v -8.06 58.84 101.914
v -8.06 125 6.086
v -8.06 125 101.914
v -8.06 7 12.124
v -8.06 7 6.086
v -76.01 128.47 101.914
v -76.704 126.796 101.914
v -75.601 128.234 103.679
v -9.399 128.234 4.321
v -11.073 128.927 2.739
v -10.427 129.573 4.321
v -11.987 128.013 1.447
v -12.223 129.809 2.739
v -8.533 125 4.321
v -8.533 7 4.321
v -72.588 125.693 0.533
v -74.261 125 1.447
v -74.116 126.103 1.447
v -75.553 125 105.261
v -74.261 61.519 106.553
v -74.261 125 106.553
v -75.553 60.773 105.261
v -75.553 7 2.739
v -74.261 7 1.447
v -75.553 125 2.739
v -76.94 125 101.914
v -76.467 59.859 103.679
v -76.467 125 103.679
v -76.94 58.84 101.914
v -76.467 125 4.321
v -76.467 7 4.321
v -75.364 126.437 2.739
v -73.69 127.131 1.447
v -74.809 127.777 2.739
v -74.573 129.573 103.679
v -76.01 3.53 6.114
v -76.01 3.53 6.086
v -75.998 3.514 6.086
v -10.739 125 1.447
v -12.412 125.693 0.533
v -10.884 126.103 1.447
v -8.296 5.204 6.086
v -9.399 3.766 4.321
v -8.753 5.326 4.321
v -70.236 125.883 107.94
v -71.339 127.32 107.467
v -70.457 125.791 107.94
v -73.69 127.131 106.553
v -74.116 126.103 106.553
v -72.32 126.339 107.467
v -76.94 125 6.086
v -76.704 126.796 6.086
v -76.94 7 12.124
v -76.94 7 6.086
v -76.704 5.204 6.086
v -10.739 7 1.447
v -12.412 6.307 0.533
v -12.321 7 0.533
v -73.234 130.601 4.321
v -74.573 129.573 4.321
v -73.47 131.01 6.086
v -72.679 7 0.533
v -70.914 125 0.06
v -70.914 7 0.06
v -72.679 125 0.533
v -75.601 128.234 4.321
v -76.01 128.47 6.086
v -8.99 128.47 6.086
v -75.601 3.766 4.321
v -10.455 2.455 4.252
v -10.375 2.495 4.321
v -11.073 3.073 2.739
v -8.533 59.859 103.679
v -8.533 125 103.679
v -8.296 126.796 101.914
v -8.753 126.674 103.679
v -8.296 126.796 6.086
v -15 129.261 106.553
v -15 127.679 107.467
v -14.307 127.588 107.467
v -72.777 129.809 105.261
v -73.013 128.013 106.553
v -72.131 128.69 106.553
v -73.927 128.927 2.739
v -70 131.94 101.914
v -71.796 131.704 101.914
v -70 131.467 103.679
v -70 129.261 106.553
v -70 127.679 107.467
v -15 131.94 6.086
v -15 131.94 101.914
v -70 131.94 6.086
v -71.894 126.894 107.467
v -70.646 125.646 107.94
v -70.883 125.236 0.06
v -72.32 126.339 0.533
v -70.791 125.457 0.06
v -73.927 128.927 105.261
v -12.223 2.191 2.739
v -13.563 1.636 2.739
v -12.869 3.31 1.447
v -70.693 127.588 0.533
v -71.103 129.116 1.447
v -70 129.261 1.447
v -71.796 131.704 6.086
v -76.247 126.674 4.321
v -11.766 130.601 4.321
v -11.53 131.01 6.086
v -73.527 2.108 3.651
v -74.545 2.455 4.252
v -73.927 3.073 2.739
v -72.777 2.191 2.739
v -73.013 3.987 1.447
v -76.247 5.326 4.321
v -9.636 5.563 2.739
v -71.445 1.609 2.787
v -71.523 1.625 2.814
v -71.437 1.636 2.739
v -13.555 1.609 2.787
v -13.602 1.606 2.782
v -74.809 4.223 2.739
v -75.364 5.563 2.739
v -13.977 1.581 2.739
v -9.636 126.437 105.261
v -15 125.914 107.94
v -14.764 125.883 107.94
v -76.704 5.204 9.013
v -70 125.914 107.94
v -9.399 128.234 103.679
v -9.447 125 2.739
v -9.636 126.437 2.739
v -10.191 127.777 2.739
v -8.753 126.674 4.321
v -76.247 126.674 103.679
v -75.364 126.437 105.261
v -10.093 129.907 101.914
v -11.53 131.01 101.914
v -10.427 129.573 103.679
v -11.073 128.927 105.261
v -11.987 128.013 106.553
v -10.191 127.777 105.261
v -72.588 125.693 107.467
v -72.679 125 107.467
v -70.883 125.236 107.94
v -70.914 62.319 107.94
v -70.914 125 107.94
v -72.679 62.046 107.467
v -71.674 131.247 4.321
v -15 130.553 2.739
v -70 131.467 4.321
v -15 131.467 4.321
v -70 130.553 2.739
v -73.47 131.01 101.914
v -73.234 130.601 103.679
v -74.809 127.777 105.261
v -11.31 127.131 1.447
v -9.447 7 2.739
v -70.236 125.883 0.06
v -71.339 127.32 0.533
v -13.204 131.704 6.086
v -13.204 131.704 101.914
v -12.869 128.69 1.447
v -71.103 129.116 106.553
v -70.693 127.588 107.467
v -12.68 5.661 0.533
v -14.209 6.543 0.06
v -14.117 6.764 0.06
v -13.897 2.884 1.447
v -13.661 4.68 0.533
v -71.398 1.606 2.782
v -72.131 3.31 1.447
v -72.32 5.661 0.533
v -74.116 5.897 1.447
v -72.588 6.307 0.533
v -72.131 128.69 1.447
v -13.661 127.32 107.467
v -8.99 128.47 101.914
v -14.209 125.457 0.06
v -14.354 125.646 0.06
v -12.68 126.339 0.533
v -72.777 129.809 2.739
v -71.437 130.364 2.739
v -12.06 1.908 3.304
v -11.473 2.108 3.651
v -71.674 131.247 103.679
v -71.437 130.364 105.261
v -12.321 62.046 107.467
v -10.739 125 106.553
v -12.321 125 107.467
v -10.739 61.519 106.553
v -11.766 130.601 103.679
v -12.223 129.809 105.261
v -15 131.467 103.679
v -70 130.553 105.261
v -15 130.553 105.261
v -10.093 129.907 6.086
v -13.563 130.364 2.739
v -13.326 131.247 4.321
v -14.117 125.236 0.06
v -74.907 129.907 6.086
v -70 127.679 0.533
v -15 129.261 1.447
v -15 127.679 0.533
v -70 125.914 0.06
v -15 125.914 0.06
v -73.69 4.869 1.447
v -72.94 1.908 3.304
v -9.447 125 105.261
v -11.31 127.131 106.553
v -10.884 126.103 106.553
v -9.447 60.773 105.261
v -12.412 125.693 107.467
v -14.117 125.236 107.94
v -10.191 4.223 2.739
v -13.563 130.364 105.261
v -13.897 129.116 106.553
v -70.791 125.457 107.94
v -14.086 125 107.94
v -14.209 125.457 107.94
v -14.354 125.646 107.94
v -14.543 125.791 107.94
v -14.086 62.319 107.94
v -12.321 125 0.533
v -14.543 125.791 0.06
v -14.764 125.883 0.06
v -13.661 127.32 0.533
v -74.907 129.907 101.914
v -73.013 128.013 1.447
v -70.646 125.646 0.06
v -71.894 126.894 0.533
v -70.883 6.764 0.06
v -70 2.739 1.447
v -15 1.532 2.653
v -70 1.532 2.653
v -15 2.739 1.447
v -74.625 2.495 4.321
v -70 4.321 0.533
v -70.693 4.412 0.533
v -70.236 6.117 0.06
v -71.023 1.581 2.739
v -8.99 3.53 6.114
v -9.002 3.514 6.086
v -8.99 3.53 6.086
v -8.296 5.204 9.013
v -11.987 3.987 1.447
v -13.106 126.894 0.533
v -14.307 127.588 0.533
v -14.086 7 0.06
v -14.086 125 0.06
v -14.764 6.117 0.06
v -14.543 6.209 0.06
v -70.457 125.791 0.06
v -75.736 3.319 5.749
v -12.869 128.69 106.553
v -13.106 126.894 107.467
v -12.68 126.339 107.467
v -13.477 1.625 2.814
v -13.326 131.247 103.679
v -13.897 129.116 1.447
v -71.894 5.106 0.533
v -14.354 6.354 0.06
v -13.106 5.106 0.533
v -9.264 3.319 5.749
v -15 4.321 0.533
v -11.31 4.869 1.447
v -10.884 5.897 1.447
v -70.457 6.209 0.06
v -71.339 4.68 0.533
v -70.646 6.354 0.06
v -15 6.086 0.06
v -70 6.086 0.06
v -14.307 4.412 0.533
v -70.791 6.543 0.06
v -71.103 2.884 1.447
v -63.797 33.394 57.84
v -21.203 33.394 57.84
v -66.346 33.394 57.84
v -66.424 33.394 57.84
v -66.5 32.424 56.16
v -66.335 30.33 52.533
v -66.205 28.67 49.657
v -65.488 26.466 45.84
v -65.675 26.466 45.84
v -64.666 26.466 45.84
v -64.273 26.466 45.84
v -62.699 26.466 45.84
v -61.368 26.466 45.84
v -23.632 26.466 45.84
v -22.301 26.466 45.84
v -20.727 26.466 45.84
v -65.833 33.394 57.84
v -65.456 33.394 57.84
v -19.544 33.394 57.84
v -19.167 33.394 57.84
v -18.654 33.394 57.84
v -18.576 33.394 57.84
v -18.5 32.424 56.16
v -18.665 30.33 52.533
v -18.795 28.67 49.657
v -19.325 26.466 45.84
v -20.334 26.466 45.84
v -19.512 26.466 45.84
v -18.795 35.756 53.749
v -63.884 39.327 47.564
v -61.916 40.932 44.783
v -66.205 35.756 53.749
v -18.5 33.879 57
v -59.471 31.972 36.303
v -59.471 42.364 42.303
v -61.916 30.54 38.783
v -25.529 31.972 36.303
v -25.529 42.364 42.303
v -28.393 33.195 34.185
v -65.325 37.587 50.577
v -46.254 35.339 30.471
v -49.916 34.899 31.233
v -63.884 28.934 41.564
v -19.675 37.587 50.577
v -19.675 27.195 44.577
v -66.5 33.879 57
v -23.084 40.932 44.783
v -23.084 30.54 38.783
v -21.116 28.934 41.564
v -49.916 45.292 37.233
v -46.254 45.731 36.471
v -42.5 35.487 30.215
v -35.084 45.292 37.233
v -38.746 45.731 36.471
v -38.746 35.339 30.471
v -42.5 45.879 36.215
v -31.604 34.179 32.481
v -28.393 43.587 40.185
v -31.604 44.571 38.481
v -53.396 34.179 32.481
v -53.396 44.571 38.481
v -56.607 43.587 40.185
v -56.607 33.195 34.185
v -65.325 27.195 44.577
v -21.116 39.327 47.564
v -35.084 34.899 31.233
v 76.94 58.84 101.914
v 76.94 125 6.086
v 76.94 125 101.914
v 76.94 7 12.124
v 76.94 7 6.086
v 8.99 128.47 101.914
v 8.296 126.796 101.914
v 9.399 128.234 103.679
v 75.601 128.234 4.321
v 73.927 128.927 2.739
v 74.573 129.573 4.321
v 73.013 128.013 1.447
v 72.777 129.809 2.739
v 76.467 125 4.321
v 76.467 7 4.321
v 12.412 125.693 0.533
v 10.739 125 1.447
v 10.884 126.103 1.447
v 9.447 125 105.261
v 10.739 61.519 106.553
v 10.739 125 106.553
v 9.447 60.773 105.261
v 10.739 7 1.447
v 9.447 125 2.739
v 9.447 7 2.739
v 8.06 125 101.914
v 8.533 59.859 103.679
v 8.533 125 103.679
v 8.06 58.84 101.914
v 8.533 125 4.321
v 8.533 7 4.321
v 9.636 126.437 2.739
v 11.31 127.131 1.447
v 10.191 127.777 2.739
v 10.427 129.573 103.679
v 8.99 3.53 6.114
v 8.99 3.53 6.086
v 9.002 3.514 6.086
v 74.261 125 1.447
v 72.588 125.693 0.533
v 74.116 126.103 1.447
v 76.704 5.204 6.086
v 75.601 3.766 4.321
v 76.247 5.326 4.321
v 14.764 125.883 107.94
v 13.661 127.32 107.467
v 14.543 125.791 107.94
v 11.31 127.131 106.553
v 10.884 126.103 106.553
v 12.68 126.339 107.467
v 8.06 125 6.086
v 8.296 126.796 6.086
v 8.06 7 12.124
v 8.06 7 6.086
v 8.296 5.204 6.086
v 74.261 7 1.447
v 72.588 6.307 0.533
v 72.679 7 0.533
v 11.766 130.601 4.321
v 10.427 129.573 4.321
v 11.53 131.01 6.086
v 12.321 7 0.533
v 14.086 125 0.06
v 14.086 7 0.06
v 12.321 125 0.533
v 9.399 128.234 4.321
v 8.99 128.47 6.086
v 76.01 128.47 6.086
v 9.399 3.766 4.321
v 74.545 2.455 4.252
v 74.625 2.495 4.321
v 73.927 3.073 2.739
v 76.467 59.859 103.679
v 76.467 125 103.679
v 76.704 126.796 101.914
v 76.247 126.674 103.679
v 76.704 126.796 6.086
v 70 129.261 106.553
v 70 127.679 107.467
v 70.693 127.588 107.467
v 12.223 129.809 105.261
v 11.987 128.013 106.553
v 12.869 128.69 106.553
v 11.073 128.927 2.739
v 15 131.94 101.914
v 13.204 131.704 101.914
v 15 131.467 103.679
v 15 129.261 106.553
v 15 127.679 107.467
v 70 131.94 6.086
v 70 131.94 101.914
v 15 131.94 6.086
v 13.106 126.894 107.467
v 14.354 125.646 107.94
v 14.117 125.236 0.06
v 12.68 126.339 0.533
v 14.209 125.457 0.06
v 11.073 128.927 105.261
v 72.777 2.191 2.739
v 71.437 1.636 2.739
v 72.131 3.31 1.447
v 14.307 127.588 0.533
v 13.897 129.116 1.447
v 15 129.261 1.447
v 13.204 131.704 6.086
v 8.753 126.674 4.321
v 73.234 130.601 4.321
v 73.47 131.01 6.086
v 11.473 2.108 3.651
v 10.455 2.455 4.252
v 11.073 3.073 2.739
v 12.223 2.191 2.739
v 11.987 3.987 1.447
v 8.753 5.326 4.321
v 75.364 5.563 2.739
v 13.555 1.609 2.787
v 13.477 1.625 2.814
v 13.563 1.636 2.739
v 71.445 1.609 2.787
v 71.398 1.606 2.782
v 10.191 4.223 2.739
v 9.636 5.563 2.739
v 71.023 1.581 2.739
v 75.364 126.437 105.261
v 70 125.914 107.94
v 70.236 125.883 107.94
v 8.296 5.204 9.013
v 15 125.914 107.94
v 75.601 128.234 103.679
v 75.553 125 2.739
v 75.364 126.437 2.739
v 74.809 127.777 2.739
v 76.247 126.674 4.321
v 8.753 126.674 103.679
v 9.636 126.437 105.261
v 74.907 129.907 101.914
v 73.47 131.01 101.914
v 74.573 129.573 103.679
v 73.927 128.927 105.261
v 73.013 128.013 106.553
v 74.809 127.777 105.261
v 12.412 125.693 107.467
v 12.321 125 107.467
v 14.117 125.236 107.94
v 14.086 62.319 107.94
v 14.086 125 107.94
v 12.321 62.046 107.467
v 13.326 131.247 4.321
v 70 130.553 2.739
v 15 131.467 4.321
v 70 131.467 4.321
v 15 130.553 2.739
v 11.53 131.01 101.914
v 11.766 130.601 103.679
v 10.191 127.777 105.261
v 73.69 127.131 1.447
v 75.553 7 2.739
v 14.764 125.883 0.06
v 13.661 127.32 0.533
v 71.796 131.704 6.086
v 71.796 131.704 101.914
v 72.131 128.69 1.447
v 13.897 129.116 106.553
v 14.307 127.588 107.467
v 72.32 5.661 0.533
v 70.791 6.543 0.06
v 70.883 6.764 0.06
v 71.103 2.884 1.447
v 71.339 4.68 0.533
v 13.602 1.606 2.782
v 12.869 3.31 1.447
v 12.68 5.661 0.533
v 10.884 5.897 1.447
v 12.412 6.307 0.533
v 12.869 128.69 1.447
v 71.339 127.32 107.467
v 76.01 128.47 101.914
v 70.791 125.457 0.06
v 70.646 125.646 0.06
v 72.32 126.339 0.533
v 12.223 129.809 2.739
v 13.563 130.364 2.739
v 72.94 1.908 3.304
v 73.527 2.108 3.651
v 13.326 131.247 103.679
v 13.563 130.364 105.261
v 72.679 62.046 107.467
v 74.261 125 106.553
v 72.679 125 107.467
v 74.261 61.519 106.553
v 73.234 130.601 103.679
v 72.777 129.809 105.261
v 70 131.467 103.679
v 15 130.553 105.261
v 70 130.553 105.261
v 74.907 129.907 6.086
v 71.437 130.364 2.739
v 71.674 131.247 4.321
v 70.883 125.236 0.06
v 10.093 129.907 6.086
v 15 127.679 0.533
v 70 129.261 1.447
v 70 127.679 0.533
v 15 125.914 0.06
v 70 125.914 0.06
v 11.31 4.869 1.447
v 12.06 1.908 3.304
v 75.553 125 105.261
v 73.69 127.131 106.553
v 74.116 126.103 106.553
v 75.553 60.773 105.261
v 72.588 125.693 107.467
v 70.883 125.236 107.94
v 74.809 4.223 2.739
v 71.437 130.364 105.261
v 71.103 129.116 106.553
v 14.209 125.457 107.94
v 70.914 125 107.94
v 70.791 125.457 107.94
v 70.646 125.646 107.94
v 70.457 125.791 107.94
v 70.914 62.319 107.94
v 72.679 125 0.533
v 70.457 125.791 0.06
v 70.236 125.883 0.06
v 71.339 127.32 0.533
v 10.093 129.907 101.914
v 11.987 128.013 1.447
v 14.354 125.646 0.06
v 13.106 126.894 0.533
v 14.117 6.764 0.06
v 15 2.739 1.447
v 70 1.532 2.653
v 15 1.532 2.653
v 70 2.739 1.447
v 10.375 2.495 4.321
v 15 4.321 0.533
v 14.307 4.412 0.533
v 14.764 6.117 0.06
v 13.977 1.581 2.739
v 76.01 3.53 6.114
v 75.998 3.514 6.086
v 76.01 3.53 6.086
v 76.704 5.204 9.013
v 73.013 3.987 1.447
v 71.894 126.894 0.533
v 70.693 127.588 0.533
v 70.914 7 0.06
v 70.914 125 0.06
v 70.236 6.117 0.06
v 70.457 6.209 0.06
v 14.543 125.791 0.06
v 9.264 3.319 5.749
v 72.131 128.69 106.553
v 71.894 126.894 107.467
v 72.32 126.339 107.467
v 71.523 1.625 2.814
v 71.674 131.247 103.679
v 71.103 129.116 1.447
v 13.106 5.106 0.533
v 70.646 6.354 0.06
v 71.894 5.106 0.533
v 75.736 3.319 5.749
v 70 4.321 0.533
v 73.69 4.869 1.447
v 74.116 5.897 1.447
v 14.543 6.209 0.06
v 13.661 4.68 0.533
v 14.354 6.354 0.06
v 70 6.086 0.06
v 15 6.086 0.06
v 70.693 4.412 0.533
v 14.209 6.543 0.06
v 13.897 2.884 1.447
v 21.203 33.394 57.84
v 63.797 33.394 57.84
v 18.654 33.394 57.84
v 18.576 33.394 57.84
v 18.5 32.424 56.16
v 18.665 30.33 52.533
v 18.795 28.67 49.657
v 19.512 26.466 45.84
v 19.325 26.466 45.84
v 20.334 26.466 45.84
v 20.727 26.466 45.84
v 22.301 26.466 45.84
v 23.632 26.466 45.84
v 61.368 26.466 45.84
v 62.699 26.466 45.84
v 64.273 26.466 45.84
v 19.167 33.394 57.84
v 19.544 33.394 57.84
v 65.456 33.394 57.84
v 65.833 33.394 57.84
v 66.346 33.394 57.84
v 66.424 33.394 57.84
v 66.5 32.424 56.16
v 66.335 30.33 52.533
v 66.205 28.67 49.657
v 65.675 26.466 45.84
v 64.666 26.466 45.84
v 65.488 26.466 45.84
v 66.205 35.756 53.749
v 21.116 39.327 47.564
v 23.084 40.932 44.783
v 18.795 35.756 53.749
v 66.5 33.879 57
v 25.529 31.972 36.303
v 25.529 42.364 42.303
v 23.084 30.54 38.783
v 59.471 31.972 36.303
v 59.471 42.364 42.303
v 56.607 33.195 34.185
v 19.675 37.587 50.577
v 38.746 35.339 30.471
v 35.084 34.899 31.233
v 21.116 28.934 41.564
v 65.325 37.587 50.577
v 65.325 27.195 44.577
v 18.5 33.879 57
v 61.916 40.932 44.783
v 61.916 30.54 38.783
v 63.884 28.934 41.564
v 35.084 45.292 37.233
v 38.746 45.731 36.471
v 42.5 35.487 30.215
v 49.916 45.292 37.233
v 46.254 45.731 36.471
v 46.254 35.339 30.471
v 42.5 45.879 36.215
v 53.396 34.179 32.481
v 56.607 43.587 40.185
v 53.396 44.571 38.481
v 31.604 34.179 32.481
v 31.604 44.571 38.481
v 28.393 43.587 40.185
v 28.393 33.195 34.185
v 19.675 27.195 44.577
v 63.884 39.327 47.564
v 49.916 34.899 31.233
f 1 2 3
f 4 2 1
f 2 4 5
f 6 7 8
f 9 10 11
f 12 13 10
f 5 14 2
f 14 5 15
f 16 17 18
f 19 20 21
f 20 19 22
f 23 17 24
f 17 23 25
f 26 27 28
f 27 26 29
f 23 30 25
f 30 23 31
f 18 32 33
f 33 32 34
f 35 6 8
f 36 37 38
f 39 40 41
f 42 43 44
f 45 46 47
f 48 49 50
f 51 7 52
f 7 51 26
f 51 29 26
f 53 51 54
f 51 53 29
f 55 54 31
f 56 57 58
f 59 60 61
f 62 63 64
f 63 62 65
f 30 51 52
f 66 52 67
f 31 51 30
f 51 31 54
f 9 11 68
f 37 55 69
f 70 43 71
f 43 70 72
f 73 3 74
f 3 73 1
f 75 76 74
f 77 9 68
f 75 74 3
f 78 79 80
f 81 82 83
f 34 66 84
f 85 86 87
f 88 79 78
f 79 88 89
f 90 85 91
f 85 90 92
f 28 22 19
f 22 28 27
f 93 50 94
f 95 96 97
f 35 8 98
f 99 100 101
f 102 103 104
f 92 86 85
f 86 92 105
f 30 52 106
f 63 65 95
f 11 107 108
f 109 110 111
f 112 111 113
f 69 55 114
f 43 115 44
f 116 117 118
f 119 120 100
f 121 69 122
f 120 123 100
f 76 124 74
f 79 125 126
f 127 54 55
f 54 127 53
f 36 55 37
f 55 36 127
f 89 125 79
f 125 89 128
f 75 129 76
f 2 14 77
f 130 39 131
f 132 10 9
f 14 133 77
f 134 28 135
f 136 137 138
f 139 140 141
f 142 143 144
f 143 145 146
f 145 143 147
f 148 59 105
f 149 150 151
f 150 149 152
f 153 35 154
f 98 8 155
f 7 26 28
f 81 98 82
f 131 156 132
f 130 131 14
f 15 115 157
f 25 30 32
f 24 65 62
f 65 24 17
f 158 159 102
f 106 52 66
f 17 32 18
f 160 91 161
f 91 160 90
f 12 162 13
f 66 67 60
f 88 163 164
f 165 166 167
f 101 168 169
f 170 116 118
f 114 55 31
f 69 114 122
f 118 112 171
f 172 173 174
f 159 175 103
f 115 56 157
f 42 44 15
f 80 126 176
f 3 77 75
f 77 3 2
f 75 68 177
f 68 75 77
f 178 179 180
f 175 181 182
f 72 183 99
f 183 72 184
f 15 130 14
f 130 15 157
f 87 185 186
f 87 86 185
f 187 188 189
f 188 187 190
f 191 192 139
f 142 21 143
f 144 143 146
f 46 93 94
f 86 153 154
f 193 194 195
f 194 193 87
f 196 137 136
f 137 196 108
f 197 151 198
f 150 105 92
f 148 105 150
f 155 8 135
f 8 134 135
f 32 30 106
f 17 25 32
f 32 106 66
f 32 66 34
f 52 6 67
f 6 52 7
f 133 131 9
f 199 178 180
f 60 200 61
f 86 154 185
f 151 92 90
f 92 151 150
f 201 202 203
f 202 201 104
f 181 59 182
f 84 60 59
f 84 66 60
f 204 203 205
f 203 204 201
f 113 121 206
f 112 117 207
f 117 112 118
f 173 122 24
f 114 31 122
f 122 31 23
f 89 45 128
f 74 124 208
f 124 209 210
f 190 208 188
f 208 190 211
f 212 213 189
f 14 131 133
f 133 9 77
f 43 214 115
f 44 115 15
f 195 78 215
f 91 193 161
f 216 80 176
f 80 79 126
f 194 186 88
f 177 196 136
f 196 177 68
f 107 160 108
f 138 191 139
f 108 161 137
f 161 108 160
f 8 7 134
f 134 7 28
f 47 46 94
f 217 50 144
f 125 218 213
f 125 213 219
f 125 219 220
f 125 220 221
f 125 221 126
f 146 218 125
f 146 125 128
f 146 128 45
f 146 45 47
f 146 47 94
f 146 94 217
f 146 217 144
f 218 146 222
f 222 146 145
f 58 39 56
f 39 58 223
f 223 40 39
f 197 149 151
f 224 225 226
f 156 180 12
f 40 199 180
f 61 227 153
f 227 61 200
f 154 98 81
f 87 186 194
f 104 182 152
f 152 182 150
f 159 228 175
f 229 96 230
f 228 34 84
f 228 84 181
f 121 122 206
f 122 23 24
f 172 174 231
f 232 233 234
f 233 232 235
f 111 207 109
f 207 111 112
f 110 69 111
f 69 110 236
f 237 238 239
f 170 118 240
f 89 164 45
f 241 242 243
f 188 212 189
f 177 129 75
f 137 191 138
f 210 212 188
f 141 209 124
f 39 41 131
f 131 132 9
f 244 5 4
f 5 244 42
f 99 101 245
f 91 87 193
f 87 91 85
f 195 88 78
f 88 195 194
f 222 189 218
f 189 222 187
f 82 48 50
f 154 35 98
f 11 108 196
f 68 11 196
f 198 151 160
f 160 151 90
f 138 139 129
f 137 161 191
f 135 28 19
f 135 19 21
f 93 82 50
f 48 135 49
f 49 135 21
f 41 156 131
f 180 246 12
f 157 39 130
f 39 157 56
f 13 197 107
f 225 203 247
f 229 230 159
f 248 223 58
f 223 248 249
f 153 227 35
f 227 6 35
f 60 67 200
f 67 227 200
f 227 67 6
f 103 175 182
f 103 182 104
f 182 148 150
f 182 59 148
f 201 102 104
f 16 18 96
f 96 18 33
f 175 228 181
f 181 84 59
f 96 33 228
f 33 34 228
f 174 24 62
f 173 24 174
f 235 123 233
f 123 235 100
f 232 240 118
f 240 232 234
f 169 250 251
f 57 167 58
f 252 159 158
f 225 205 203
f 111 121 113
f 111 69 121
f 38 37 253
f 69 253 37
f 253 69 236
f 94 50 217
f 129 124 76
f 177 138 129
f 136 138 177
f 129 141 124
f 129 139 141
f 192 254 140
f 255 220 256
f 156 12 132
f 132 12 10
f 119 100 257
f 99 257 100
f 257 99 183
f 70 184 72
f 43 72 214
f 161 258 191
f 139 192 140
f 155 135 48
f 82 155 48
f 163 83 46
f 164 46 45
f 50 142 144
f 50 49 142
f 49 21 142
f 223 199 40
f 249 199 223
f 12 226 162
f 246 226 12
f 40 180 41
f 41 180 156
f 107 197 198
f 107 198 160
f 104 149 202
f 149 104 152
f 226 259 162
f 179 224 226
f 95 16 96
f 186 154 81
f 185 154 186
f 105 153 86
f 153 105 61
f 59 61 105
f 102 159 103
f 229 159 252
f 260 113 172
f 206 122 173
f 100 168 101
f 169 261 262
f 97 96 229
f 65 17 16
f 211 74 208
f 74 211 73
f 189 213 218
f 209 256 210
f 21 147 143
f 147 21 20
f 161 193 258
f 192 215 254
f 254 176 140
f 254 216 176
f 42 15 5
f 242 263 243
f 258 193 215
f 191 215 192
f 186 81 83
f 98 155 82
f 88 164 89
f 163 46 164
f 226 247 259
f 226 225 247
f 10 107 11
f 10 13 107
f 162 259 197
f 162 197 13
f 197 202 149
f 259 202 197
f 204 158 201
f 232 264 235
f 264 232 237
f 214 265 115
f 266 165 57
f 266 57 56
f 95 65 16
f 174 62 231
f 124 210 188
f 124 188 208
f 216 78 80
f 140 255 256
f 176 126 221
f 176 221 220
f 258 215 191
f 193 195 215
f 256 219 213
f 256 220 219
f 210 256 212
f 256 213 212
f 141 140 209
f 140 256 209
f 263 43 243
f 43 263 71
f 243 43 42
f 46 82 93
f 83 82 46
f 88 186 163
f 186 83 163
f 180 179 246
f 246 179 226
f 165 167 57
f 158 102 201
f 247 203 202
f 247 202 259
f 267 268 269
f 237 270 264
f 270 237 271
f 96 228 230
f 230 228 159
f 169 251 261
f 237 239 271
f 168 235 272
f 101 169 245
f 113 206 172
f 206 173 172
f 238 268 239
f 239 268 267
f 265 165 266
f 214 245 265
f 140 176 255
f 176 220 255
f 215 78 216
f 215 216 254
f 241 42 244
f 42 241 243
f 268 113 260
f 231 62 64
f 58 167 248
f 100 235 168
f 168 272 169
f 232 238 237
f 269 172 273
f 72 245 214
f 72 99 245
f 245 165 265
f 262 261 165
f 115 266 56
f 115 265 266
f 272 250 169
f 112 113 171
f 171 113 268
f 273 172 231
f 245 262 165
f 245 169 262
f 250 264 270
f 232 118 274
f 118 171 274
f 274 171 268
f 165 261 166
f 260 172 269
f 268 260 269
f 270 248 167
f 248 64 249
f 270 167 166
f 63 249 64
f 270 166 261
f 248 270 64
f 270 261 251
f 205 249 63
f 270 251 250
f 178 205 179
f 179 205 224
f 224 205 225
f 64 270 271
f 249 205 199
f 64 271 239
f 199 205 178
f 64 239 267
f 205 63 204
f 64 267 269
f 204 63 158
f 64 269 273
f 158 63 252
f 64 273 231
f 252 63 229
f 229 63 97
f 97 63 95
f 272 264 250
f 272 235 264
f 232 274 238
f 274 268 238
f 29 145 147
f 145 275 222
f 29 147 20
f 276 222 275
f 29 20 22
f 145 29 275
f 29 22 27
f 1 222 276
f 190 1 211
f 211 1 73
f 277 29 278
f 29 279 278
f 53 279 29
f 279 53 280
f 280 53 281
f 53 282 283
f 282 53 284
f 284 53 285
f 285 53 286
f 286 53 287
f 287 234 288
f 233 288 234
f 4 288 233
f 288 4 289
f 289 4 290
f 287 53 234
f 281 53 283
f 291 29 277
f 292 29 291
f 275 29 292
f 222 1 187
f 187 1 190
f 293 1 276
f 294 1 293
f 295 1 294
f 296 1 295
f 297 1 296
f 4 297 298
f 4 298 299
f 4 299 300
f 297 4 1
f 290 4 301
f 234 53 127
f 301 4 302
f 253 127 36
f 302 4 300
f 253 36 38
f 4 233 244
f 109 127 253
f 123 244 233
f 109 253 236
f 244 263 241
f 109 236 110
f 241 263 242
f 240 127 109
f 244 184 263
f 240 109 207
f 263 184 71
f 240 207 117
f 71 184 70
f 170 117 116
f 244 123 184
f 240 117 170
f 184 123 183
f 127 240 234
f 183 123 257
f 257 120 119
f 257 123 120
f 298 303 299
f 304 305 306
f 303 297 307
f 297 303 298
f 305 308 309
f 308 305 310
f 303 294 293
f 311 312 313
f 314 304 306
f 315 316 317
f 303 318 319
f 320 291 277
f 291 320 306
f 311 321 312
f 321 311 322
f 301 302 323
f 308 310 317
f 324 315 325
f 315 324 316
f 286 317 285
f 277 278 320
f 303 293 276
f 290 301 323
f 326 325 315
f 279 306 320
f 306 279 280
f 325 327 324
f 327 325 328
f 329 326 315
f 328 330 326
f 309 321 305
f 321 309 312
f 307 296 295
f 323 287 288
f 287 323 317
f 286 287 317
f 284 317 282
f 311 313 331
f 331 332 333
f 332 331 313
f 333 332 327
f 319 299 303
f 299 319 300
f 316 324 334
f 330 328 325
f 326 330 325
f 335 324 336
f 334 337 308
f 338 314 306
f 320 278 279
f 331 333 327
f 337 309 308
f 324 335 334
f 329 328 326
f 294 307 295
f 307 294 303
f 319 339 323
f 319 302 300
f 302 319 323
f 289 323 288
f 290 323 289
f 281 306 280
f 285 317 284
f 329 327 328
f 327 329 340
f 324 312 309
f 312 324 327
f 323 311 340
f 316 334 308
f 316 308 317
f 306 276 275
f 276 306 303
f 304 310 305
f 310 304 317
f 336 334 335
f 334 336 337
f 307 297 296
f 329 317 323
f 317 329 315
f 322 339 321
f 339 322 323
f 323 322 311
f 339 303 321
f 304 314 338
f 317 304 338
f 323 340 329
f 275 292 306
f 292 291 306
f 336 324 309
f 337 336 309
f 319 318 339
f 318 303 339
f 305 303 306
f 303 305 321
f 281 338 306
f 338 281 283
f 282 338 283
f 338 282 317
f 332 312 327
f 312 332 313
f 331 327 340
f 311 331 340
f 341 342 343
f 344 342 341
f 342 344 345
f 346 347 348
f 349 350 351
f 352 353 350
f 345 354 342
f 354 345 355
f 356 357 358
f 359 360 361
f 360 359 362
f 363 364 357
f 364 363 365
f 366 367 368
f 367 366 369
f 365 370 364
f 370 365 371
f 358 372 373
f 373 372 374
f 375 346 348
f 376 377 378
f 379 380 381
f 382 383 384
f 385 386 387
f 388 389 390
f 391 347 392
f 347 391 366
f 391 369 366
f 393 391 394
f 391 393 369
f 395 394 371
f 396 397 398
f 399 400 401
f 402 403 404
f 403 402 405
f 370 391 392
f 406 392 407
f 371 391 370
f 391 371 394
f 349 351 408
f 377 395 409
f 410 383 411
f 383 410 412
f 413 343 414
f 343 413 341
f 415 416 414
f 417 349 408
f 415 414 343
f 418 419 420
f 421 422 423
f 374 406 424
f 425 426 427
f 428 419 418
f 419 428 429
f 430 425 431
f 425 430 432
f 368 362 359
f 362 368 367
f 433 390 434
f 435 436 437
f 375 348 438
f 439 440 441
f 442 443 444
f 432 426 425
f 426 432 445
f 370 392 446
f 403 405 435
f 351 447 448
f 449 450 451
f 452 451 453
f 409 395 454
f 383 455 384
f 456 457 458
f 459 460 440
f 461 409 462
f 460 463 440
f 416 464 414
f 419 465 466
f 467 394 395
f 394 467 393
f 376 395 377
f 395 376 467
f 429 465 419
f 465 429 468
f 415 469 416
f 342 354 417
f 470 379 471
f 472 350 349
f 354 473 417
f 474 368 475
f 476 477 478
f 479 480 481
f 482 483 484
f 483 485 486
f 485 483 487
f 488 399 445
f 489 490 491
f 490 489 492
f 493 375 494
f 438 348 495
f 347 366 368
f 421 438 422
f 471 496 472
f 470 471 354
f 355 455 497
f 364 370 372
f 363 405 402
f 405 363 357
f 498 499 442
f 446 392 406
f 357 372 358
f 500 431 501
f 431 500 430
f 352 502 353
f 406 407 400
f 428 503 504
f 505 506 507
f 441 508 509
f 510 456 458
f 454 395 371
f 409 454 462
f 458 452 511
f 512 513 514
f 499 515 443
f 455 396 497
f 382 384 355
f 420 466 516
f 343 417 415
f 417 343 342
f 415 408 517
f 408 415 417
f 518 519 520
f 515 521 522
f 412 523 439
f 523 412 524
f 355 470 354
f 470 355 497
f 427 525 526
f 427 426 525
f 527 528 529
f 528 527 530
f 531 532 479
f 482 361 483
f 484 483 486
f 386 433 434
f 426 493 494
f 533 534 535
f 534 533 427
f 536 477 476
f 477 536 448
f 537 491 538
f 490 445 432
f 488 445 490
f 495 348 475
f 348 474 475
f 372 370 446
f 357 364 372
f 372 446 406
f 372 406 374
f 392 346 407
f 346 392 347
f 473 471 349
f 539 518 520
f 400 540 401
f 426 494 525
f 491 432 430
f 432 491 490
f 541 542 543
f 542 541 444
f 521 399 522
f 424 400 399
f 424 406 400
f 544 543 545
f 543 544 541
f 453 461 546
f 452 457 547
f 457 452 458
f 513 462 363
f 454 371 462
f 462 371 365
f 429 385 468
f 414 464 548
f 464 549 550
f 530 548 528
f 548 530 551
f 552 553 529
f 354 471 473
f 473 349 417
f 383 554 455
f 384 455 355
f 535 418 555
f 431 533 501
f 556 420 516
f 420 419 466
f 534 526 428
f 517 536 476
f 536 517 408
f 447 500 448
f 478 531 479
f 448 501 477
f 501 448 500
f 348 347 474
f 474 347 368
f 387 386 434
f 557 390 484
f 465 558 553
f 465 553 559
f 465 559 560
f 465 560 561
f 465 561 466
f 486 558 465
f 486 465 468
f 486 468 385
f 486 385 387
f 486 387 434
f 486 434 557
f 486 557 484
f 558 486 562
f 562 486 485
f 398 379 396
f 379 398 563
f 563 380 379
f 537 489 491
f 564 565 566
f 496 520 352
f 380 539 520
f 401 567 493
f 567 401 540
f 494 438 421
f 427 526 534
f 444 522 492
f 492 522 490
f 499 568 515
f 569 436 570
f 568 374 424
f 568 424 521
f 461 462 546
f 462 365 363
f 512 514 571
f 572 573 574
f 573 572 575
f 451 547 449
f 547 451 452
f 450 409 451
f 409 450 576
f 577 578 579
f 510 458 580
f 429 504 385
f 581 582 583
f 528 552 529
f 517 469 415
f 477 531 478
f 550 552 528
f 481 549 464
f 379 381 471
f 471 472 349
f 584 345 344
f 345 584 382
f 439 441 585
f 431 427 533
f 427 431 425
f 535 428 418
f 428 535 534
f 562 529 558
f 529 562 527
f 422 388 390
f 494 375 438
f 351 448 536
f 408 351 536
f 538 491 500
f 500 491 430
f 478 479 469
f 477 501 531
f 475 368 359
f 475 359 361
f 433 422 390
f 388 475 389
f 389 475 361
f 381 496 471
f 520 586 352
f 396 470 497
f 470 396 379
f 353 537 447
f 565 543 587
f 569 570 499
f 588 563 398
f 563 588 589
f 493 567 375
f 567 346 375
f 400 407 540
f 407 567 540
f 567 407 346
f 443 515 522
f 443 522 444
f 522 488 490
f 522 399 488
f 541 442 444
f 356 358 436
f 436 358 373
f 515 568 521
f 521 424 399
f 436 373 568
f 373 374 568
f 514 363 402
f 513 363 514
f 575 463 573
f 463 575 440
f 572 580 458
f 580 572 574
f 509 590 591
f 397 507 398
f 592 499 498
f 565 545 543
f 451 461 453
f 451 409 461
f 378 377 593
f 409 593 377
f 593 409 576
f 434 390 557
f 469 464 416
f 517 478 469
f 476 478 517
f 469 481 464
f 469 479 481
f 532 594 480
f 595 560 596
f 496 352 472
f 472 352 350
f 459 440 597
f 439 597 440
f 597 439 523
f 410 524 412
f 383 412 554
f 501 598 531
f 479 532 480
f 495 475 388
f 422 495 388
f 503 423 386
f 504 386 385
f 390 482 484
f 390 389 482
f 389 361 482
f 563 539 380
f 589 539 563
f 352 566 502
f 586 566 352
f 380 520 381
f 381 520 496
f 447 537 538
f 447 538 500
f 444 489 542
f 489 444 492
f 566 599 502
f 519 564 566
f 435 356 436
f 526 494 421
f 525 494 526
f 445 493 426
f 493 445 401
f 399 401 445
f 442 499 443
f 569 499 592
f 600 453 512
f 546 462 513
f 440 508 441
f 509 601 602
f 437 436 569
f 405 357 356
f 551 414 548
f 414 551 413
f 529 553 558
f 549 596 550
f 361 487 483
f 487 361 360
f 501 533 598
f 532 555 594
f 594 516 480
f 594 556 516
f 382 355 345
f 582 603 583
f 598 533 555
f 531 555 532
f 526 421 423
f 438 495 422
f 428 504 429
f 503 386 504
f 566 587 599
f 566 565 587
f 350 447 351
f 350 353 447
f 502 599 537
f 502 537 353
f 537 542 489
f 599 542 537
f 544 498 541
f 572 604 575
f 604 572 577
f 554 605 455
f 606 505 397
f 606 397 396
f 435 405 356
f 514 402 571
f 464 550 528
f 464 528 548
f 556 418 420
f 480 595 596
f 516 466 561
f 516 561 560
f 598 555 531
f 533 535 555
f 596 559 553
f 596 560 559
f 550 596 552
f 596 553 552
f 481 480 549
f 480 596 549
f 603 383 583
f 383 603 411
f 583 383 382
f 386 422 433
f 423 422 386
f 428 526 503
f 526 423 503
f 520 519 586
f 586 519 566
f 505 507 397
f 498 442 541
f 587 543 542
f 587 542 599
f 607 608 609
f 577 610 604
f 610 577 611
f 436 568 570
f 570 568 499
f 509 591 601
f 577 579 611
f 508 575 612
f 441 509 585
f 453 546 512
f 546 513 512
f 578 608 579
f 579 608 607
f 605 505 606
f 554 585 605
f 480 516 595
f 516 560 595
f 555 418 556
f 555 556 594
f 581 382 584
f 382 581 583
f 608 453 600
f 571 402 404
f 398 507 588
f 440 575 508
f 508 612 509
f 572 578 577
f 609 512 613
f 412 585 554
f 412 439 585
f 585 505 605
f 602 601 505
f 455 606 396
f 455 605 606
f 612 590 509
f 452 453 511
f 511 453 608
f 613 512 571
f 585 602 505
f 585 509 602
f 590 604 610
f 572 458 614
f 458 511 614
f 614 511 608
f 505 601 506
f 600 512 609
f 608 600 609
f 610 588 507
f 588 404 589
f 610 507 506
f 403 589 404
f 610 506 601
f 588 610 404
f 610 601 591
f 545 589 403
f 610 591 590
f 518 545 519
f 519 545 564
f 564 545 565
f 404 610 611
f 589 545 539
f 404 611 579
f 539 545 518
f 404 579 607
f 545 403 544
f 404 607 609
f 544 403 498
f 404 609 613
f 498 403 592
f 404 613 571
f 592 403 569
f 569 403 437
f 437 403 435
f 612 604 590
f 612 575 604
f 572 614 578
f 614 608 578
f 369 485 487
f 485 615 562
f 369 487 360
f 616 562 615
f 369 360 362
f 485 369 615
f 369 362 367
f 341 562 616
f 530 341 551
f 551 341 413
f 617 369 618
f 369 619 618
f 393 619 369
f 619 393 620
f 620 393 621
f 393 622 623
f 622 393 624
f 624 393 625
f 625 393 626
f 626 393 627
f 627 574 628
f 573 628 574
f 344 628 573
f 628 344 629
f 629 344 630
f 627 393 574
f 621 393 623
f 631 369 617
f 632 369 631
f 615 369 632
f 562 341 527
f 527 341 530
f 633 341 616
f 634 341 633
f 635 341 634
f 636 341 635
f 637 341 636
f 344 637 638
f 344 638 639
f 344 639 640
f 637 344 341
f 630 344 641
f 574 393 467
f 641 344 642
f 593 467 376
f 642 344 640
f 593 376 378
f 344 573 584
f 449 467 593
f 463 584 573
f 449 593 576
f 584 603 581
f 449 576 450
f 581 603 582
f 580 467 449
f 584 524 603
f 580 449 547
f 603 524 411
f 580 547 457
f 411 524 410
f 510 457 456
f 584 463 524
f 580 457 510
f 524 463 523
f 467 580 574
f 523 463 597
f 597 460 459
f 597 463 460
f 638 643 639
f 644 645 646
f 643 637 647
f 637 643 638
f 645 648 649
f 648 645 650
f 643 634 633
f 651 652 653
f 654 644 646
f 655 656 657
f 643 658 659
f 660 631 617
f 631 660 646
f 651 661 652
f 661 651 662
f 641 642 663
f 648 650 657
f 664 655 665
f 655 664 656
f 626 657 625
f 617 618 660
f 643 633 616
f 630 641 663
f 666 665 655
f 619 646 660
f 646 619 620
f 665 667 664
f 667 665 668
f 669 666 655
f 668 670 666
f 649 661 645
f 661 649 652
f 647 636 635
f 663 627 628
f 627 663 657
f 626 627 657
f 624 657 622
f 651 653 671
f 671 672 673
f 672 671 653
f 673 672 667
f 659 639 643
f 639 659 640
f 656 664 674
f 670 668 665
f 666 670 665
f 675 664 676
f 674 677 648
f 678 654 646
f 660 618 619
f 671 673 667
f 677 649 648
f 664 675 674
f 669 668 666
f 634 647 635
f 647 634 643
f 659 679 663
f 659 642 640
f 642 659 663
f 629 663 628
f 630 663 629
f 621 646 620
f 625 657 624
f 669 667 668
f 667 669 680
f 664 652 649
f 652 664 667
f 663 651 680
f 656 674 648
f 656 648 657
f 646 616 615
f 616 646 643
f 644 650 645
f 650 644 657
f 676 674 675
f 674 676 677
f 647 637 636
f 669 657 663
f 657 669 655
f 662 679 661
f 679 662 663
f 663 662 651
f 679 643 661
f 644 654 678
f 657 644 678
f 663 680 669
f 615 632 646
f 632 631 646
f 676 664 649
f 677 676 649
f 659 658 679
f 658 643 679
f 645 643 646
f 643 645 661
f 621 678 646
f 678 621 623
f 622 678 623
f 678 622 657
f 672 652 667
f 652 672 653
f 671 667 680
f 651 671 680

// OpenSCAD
// =============================================================================
// CONSOLE10 — Lower Speaker Panel  v0.2  (2x FUNLOGY FLSS1)
//
// The FLSS1 is a WEDGE: it sits FLAT on its base and its baffle is already
// raked ~30 deg so the driver aims up at the seated user. So we do NOT tilt the
// speakers — they sit flat in the lower bay; the panel is just thin rails that
// locate them and REST ON THE CONSOLE FLOOR, plus a low front lip.
//
// Frame: z=0 = console floor TOP (world Z=6); console front at Y=0, back +Y;
// X = width, centered. Interior between cheeks = 233.
// =============================================================================

// ---- console interior refs ----
interior_w = 233;

// ---- FLSS1 wedge envelope ----
sp_w      = 69;
sp_d      = 132;
sp_h      = 108;
baffle_v  = 30;                       // built-in baffle rake, from vertical
baffle_run = sp_h * tan(baffle_v);    // 62.4 — how far the baffle top sets back
driver_d  = 48;
gap       = 16;                       // between the two speakers

// ---- locating rails / front lip ----
rail_t  = 4;       // thin plate thickness
rail_h  = 50;      // low side-rail height (locates the base, clears body + dial)
front_h = 20;      // low front lip
$fn = 56;

pair_w = 2*sp_w + gap;
cxs    = [-(sp_w + gap)/2, (sp_w + gap)/2];

echo(str("LOWER SPEAKER PANEL v0.2 — 2x FLSS1 (flat, ", baffle_v, " deg baffle) ",
         sp_w, "x", sp_d, "x", sp_h, " | pair ", pair_w, " mm | rails h", rail_h));

// FLSS1 as a flat-sitting wedge: full box minus the front-top prism so the
// front face is the raked baffle (front-bottom edge at Y=0, baffle top set back).
module spk_wedge() {
    r = 7;   // rounded edges
    difference() {
        minkowski() {
            translate([-sp_w/2 + r, r, r]) cube([sp_w - 2*r, sp_d - 2*r, sp_h - 2*r]);
            sphere(r, $fn = 24);
        }
        // raked baffle: shear the front-top so the front face leans back baffle_v from vertical
        rotate([-baffle_v, 0, 0]) translate([-sp_w/2 - 5, -300, -8]) cube([sp_w + 10, 300, sp_h*3]);
        // circular driver recess in the baffle
        translate([0, baffle_run*0.46, sp_h*0.5])
            rotate([-(90 - baffle_v), 0, 0]) cylinder(d = driver_d, h = 12, center = true, $fn = 40);
    }
}
module spk(x) { translate([x, 0, 0]) spk_wedge(); }   // sits FLAT on the floor

// thin vertical rail resting on the floor, running the speaker depth
module rail(x) { translate([x - rail_t/2, 0, 0]) cube([rail_t, sp_d, rail_h]); }

module lower_speaker_panel() {
    color("Gainsboro") {
        // side rails: outer-L, center (in the gap), outer-R
        rail(-pair_w/2);              // left outer
        rail(0);                      // center divider
        rail( pair_w/2);              // right outer
        // low front lip across the pair
        translate([-pair_w/2, -rail_t, 0]) cube([pair_w, rail_t, front_h]);
    }
    // speaker mocks (fit-check)
    for (x = cxs) color("DimGray", 0.9) spk(x);
}

// panel removed — just the two FLSS1 placeholders (orbit / side view shows the profile)
for (x = cxs) color("DimGray") spk(x);
